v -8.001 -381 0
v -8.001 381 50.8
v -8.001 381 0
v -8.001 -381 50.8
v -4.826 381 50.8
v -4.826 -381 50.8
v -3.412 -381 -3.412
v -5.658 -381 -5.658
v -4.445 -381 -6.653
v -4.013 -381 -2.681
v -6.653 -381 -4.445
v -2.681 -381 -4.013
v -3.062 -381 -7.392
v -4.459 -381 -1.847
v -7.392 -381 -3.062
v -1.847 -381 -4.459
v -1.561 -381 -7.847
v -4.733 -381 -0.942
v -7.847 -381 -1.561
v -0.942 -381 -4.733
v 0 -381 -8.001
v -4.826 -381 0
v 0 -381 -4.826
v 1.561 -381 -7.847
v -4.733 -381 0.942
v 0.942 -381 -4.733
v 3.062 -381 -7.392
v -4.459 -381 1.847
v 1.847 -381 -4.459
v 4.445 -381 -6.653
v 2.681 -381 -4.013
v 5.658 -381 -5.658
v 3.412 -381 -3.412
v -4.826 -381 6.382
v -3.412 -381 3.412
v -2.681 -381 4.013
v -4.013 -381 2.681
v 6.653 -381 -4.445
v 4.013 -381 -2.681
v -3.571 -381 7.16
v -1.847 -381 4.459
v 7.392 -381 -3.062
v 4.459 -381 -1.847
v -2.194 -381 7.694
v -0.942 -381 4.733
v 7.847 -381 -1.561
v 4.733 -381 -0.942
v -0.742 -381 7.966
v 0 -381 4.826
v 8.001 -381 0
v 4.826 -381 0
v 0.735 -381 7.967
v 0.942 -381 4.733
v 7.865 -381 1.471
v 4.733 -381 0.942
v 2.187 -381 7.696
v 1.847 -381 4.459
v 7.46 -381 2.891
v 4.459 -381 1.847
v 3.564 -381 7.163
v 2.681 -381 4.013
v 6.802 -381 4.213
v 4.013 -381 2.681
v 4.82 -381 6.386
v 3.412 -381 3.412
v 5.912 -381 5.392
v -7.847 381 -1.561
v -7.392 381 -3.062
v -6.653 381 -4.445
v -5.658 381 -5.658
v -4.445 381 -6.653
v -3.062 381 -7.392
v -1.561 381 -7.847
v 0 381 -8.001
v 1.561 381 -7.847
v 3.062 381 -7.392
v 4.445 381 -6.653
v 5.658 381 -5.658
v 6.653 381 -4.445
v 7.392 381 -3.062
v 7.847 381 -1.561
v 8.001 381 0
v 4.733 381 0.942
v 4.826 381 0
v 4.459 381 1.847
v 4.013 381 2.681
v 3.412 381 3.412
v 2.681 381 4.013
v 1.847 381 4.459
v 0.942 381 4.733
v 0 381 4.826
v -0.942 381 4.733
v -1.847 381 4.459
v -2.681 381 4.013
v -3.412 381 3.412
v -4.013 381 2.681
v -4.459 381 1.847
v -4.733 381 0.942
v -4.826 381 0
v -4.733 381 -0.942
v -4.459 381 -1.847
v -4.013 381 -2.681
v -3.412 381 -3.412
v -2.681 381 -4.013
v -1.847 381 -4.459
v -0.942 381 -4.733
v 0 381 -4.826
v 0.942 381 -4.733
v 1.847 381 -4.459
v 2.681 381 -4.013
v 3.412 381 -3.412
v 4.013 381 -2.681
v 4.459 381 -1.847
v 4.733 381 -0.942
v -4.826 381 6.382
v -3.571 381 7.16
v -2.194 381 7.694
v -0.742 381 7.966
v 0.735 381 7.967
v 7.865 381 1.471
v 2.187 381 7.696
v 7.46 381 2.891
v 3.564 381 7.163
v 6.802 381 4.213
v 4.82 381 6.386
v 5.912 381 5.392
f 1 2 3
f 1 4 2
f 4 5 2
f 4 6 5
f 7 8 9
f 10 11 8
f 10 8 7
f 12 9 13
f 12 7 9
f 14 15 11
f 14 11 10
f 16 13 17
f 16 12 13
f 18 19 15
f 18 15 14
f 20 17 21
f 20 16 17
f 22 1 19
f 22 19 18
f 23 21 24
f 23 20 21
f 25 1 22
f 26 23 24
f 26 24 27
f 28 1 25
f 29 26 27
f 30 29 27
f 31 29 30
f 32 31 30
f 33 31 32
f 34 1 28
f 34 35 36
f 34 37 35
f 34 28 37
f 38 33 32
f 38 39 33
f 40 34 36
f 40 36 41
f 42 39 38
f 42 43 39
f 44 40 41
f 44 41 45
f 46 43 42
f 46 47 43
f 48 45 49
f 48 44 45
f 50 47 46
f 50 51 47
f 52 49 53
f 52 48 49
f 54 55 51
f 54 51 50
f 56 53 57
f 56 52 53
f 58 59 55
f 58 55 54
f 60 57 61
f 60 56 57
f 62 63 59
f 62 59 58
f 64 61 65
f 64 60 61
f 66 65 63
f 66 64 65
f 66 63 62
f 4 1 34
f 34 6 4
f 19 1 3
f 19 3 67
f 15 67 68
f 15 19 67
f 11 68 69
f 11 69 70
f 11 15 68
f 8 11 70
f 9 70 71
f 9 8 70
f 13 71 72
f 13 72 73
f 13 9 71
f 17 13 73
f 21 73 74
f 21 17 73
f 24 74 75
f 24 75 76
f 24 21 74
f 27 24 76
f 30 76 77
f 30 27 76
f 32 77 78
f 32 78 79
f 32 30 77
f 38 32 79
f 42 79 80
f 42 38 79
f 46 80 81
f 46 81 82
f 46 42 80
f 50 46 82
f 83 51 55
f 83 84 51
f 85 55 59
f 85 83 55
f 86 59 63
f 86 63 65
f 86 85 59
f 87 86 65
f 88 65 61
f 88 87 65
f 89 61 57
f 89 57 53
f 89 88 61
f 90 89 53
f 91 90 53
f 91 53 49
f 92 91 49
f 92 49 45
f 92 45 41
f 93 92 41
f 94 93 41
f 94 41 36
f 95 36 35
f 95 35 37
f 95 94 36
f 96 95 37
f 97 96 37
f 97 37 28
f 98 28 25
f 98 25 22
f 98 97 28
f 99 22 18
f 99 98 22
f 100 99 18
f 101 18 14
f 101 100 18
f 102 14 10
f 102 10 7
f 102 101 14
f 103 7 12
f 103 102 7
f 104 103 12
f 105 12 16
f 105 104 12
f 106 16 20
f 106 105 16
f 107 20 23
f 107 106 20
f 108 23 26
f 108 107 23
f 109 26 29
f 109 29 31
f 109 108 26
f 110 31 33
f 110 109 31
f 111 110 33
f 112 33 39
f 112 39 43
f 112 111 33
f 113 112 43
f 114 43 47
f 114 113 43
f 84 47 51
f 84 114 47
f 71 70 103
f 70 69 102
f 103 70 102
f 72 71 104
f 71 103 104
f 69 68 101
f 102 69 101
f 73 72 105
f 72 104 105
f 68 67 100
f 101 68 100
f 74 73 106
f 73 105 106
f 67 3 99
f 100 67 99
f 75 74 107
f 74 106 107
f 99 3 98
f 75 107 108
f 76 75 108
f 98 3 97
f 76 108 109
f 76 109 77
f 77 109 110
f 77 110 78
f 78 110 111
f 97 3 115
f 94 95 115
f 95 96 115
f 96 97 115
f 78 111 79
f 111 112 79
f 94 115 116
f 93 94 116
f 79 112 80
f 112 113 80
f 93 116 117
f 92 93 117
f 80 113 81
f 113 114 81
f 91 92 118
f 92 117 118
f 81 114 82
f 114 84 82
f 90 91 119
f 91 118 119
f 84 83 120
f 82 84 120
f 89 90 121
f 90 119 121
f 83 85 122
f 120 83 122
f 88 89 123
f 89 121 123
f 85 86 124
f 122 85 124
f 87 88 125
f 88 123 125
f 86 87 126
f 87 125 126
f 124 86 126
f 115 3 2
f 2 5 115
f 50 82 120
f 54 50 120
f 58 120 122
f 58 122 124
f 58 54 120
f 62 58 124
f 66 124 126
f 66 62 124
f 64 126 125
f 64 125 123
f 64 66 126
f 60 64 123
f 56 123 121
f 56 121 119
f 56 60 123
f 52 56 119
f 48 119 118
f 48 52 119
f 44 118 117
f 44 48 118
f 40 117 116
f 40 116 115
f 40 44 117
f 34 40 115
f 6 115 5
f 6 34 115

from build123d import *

# Parameters (mm, degrees)
F0_R     = 4.826
F1_DEPTH = 381


with BuildPart() as f1:
    # F0 (on Front) → F1 (new body, symmetric)
    with BuildSketch(Plane.XZ):
        with BuildLine():
            Line((-8.001, 50.8), (-8.001, 0))
            ThreePointArc((-8.001, 0), (0, -8.001), (8.001, 0))
            ThreePointArc((8.001, 0), (3.563929, 7.163408), (-4.826, 6.381671))
            Line((-4.826, 6.381671), (-4.826, 50.8))
            Line((-4.826, 50.8), (-8.001, 50.8))
        make_face()
        Circle(F0_R, mode=Mode.SUBTRACT)
    extrude(amount=F1_DEPTH, both=True)


solid = f1.part
